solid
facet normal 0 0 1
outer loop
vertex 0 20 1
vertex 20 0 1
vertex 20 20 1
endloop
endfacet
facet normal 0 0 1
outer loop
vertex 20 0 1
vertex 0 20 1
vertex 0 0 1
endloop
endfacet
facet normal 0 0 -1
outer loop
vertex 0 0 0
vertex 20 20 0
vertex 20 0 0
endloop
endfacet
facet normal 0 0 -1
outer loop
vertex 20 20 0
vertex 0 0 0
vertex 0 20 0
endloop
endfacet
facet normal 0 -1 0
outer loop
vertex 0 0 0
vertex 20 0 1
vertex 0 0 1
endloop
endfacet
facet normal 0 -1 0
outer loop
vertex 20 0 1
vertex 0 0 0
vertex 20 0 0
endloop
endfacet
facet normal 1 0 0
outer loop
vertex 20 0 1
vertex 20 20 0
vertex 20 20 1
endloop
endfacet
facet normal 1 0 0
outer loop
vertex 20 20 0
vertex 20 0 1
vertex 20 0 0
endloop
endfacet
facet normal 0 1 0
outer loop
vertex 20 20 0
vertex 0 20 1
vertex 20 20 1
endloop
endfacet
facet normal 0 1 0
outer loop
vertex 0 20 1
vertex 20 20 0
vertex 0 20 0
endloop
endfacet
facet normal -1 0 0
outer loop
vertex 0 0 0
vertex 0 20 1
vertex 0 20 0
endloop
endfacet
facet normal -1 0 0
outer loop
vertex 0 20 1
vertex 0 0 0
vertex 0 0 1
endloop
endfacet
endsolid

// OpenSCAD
// file: used_with_sections.scad
/* [Required Dimensions] */

// Width
width = 10;

/* [Advanced Options] */

// Depth
depth = 5;

module used_module_with_sections(w, d) {
    cube([w, d, 1]);
}
// main file
use <used_with_sections.scad>

/* [My Settings] */

// Size
size = 20;

used_module_with_sections(size, size);
